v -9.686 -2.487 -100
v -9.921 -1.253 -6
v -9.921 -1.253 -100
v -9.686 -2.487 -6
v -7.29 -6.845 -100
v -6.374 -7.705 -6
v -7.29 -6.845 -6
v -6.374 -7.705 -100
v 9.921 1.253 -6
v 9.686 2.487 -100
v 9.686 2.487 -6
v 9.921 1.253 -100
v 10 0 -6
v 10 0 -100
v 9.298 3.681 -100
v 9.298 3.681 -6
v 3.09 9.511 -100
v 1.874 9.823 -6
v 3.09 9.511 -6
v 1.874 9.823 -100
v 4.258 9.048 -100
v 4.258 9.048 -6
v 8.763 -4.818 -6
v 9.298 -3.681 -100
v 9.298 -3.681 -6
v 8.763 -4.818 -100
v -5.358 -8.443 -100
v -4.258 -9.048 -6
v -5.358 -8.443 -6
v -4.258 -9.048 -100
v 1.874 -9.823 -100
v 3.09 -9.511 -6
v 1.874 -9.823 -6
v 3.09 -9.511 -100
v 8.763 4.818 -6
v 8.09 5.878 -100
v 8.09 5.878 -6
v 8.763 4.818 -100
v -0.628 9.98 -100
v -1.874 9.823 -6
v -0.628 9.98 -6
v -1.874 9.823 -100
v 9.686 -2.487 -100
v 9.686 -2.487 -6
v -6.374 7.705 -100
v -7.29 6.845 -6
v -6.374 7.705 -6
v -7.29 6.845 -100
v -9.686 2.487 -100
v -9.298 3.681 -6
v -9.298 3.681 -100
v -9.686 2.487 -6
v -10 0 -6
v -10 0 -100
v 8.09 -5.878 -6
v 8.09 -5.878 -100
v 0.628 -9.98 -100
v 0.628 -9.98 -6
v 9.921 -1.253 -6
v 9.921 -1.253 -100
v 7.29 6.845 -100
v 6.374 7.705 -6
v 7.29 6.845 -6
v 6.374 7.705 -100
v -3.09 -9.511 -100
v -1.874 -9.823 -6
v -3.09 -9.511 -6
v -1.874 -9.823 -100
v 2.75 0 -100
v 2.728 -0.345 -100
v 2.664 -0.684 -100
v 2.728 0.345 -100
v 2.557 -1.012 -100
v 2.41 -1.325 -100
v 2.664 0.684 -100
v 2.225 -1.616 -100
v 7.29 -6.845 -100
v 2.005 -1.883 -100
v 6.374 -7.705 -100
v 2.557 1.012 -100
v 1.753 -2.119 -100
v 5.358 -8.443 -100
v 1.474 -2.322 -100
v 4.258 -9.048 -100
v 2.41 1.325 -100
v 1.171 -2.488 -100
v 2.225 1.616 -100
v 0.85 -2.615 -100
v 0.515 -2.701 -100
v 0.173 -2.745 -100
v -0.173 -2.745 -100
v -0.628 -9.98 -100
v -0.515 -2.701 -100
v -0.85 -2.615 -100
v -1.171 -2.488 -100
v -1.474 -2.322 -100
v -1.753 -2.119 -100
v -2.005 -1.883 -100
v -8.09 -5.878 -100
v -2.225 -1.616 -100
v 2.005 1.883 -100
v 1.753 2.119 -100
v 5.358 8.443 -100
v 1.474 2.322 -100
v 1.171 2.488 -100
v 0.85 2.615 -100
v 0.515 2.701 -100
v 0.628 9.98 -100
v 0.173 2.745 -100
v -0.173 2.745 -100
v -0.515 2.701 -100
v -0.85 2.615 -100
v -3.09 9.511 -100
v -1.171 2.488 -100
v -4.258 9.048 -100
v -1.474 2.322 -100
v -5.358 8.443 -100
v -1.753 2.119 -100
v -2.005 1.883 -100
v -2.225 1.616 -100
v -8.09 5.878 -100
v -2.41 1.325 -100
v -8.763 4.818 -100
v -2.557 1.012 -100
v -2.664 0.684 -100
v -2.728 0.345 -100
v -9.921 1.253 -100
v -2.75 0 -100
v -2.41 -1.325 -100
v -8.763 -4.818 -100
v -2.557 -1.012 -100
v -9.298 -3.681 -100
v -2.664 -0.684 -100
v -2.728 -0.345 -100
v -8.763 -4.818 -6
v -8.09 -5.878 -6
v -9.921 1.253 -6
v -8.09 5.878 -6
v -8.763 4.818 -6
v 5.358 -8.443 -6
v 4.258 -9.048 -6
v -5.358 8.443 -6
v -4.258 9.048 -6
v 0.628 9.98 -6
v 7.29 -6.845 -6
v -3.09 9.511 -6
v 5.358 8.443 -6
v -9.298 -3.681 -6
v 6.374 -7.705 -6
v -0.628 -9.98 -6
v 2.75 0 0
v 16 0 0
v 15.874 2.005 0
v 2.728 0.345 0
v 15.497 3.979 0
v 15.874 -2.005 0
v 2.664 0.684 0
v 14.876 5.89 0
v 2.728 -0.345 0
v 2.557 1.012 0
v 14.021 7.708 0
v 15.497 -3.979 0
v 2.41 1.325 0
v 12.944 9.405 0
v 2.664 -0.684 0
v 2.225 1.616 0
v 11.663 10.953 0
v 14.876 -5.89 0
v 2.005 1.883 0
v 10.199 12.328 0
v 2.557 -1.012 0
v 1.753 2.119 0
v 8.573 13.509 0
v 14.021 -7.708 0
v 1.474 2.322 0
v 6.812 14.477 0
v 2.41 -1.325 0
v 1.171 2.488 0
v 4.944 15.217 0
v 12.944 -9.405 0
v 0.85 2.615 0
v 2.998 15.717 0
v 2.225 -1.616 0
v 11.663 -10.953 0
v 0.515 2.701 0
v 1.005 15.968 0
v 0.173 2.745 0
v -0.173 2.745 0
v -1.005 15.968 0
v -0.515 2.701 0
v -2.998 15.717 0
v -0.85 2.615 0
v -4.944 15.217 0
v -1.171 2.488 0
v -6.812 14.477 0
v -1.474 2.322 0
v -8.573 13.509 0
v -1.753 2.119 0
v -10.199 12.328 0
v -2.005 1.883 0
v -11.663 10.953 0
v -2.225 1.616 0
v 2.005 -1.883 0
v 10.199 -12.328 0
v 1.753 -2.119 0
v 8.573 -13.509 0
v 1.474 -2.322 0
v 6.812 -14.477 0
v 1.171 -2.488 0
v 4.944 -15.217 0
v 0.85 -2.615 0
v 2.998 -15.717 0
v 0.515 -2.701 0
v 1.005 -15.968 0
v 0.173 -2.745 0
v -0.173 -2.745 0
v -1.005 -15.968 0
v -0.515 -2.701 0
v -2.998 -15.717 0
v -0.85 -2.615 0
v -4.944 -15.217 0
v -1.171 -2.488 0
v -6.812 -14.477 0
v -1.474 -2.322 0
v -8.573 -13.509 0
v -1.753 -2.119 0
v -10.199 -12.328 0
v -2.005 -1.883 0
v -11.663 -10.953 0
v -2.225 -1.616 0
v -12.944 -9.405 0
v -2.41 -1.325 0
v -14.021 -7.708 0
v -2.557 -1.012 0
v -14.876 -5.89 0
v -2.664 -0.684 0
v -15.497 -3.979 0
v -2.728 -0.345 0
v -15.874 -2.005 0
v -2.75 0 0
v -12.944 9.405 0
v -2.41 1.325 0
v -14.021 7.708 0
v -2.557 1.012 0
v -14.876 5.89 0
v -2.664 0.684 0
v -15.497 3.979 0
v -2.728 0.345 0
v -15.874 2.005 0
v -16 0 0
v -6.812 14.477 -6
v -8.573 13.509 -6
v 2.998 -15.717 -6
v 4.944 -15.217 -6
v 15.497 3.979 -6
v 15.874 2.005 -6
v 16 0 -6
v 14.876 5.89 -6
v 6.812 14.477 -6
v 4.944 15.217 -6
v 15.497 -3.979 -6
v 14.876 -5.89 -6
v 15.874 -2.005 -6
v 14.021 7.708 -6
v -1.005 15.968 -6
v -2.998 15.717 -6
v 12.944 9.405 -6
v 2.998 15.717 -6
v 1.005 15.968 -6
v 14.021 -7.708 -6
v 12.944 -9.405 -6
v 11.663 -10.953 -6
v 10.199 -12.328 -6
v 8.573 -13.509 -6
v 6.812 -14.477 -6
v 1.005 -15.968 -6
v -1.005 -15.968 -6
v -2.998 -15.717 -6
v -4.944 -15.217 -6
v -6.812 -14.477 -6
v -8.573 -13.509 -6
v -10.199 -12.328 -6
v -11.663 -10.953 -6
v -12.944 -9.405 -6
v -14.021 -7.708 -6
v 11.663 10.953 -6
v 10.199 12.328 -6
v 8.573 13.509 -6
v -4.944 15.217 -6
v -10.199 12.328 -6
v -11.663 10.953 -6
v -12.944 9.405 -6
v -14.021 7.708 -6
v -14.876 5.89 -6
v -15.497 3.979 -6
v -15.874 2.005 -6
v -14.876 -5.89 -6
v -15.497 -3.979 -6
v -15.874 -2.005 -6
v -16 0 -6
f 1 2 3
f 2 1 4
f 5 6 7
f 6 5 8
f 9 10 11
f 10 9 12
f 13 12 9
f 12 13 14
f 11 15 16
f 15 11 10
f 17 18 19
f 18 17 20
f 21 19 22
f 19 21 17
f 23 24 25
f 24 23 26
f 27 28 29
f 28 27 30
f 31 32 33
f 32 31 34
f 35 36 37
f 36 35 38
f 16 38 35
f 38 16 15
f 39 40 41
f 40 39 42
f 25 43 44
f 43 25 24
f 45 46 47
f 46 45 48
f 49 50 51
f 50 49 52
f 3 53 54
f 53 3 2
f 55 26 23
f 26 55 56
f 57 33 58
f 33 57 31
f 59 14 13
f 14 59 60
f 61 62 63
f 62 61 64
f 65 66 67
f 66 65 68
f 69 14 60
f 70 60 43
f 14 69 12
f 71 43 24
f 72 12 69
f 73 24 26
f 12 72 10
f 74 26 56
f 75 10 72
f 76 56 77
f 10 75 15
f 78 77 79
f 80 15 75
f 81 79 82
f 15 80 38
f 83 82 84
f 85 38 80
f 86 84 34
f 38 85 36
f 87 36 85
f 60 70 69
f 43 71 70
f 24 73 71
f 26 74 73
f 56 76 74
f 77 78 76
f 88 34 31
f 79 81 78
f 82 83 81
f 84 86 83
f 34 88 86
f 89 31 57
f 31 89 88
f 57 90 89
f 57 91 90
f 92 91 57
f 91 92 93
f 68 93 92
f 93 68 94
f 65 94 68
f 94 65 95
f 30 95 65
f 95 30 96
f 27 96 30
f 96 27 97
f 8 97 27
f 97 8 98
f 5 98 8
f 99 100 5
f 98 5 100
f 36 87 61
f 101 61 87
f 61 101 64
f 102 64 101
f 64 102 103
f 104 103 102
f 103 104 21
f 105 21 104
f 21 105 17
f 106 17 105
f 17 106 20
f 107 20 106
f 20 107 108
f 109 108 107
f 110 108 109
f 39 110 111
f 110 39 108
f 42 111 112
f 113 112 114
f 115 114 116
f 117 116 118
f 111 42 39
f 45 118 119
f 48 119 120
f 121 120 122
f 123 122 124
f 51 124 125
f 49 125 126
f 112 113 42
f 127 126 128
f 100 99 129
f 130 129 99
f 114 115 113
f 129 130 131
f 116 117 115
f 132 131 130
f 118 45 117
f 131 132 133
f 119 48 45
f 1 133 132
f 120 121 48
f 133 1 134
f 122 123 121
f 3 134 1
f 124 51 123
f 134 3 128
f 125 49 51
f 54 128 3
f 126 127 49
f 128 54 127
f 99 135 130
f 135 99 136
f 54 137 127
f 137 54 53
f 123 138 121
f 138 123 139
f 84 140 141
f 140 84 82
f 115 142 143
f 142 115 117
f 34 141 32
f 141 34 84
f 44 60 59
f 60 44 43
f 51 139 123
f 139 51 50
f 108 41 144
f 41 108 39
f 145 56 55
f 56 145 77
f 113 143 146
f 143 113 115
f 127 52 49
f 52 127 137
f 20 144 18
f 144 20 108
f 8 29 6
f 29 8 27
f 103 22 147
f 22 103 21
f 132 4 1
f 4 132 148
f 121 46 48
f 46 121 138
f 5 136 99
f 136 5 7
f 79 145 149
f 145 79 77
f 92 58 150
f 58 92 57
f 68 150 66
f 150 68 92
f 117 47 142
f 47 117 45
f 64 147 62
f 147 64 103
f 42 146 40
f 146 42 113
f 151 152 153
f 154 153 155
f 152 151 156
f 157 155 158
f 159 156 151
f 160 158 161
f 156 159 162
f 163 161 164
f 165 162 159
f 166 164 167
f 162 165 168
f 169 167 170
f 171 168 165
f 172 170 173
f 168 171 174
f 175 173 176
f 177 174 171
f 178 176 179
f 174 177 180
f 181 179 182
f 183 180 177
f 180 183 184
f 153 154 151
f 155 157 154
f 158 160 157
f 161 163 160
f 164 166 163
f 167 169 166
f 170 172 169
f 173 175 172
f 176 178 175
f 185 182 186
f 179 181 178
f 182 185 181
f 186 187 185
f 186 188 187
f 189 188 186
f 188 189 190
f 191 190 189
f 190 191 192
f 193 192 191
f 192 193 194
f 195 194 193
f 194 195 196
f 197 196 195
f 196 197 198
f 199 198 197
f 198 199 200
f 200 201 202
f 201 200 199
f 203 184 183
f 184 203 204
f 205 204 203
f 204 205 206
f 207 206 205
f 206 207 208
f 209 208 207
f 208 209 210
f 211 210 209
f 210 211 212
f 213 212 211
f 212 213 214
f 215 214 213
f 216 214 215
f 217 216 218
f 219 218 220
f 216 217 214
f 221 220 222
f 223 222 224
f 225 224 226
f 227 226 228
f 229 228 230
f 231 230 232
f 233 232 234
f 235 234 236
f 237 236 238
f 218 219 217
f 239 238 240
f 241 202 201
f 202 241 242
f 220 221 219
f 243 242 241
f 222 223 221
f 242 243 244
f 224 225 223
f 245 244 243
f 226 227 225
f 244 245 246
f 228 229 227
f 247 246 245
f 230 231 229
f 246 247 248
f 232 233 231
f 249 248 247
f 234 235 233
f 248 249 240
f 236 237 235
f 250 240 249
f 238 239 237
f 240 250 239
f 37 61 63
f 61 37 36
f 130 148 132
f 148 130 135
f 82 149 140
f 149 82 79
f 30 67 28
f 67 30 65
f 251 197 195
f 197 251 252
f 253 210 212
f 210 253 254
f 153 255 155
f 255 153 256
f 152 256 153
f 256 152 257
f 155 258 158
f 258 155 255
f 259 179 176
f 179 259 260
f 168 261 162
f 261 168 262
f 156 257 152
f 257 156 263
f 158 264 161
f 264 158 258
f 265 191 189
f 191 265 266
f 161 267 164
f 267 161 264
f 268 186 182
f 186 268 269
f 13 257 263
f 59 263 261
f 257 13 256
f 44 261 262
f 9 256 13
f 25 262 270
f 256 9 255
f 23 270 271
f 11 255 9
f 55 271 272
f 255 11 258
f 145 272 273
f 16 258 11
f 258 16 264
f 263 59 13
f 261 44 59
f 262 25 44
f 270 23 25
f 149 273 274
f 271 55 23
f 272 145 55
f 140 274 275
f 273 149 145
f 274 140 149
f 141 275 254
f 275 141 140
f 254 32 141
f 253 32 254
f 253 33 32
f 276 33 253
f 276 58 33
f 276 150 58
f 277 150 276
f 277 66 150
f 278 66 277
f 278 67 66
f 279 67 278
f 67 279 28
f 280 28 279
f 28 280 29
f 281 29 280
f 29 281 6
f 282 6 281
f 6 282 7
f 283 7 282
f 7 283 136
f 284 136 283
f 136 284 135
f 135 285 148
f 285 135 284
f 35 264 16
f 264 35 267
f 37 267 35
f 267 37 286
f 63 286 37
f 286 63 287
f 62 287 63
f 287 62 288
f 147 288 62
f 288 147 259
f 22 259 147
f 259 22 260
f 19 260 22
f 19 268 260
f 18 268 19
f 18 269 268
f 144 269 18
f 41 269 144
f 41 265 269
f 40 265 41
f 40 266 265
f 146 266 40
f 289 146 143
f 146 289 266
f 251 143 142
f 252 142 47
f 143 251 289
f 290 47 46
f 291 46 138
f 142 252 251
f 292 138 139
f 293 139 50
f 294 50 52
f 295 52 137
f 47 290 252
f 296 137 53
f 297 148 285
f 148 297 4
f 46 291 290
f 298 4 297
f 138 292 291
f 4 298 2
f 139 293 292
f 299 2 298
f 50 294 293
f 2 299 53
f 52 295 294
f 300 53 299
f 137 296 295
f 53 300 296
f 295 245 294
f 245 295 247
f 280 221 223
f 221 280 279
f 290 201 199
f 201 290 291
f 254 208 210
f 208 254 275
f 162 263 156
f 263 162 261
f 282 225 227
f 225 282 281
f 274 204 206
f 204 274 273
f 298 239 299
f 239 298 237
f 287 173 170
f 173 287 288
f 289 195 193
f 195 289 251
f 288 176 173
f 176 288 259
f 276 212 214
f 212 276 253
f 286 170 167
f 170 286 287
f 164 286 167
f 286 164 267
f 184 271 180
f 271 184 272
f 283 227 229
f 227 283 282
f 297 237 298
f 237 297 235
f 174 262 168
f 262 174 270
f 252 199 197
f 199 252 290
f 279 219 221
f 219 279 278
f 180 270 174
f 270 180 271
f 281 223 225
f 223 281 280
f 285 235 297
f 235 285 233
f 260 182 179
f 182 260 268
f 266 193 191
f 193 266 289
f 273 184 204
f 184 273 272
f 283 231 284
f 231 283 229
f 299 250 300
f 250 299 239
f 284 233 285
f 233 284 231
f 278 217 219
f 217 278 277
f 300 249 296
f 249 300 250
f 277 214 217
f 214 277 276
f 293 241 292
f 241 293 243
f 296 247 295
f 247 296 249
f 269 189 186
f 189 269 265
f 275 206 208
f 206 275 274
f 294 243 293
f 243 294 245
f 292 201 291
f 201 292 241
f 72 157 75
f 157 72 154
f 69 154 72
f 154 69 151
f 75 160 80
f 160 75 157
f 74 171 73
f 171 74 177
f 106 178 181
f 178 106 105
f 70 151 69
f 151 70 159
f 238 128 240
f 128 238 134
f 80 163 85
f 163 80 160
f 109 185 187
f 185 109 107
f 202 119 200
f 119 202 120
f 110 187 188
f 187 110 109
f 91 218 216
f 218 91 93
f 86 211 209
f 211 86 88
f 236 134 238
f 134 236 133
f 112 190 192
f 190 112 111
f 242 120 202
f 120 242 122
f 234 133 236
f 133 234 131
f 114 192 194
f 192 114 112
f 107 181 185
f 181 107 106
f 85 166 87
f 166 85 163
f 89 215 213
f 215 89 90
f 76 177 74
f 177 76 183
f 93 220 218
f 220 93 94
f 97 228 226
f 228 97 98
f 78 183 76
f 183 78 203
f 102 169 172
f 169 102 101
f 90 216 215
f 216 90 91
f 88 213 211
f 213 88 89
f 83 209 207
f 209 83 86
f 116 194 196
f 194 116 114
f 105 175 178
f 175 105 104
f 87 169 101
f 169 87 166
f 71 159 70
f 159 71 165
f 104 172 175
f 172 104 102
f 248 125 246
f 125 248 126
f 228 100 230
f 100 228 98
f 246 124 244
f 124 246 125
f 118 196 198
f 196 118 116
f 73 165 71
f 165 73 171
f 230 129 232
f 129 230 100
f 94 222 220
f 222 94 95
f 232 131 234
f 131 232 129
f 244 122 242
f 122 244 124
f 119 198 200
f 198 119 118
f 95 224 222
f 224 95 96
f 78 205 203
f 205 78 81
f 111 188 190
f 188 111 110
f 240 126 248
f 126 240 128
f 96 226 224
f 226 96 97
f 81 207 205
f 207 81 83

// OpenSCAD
$fn = 50;


difference() {
	union() {
		translate(v = [0, 0, -100.0000000000]) {
			cylinder(h = 100, r = 10.0000000000);
		}
		translate(v = [0, 0, -6.0000000000]) {
			cylinder(h = 6, r = 16.0000000000);
		}
	}
	union() {
		#translate(v = [0, 0, -100]) {
			cylinder(h = 100, r = 2.7500000000);
		}
	}
}
